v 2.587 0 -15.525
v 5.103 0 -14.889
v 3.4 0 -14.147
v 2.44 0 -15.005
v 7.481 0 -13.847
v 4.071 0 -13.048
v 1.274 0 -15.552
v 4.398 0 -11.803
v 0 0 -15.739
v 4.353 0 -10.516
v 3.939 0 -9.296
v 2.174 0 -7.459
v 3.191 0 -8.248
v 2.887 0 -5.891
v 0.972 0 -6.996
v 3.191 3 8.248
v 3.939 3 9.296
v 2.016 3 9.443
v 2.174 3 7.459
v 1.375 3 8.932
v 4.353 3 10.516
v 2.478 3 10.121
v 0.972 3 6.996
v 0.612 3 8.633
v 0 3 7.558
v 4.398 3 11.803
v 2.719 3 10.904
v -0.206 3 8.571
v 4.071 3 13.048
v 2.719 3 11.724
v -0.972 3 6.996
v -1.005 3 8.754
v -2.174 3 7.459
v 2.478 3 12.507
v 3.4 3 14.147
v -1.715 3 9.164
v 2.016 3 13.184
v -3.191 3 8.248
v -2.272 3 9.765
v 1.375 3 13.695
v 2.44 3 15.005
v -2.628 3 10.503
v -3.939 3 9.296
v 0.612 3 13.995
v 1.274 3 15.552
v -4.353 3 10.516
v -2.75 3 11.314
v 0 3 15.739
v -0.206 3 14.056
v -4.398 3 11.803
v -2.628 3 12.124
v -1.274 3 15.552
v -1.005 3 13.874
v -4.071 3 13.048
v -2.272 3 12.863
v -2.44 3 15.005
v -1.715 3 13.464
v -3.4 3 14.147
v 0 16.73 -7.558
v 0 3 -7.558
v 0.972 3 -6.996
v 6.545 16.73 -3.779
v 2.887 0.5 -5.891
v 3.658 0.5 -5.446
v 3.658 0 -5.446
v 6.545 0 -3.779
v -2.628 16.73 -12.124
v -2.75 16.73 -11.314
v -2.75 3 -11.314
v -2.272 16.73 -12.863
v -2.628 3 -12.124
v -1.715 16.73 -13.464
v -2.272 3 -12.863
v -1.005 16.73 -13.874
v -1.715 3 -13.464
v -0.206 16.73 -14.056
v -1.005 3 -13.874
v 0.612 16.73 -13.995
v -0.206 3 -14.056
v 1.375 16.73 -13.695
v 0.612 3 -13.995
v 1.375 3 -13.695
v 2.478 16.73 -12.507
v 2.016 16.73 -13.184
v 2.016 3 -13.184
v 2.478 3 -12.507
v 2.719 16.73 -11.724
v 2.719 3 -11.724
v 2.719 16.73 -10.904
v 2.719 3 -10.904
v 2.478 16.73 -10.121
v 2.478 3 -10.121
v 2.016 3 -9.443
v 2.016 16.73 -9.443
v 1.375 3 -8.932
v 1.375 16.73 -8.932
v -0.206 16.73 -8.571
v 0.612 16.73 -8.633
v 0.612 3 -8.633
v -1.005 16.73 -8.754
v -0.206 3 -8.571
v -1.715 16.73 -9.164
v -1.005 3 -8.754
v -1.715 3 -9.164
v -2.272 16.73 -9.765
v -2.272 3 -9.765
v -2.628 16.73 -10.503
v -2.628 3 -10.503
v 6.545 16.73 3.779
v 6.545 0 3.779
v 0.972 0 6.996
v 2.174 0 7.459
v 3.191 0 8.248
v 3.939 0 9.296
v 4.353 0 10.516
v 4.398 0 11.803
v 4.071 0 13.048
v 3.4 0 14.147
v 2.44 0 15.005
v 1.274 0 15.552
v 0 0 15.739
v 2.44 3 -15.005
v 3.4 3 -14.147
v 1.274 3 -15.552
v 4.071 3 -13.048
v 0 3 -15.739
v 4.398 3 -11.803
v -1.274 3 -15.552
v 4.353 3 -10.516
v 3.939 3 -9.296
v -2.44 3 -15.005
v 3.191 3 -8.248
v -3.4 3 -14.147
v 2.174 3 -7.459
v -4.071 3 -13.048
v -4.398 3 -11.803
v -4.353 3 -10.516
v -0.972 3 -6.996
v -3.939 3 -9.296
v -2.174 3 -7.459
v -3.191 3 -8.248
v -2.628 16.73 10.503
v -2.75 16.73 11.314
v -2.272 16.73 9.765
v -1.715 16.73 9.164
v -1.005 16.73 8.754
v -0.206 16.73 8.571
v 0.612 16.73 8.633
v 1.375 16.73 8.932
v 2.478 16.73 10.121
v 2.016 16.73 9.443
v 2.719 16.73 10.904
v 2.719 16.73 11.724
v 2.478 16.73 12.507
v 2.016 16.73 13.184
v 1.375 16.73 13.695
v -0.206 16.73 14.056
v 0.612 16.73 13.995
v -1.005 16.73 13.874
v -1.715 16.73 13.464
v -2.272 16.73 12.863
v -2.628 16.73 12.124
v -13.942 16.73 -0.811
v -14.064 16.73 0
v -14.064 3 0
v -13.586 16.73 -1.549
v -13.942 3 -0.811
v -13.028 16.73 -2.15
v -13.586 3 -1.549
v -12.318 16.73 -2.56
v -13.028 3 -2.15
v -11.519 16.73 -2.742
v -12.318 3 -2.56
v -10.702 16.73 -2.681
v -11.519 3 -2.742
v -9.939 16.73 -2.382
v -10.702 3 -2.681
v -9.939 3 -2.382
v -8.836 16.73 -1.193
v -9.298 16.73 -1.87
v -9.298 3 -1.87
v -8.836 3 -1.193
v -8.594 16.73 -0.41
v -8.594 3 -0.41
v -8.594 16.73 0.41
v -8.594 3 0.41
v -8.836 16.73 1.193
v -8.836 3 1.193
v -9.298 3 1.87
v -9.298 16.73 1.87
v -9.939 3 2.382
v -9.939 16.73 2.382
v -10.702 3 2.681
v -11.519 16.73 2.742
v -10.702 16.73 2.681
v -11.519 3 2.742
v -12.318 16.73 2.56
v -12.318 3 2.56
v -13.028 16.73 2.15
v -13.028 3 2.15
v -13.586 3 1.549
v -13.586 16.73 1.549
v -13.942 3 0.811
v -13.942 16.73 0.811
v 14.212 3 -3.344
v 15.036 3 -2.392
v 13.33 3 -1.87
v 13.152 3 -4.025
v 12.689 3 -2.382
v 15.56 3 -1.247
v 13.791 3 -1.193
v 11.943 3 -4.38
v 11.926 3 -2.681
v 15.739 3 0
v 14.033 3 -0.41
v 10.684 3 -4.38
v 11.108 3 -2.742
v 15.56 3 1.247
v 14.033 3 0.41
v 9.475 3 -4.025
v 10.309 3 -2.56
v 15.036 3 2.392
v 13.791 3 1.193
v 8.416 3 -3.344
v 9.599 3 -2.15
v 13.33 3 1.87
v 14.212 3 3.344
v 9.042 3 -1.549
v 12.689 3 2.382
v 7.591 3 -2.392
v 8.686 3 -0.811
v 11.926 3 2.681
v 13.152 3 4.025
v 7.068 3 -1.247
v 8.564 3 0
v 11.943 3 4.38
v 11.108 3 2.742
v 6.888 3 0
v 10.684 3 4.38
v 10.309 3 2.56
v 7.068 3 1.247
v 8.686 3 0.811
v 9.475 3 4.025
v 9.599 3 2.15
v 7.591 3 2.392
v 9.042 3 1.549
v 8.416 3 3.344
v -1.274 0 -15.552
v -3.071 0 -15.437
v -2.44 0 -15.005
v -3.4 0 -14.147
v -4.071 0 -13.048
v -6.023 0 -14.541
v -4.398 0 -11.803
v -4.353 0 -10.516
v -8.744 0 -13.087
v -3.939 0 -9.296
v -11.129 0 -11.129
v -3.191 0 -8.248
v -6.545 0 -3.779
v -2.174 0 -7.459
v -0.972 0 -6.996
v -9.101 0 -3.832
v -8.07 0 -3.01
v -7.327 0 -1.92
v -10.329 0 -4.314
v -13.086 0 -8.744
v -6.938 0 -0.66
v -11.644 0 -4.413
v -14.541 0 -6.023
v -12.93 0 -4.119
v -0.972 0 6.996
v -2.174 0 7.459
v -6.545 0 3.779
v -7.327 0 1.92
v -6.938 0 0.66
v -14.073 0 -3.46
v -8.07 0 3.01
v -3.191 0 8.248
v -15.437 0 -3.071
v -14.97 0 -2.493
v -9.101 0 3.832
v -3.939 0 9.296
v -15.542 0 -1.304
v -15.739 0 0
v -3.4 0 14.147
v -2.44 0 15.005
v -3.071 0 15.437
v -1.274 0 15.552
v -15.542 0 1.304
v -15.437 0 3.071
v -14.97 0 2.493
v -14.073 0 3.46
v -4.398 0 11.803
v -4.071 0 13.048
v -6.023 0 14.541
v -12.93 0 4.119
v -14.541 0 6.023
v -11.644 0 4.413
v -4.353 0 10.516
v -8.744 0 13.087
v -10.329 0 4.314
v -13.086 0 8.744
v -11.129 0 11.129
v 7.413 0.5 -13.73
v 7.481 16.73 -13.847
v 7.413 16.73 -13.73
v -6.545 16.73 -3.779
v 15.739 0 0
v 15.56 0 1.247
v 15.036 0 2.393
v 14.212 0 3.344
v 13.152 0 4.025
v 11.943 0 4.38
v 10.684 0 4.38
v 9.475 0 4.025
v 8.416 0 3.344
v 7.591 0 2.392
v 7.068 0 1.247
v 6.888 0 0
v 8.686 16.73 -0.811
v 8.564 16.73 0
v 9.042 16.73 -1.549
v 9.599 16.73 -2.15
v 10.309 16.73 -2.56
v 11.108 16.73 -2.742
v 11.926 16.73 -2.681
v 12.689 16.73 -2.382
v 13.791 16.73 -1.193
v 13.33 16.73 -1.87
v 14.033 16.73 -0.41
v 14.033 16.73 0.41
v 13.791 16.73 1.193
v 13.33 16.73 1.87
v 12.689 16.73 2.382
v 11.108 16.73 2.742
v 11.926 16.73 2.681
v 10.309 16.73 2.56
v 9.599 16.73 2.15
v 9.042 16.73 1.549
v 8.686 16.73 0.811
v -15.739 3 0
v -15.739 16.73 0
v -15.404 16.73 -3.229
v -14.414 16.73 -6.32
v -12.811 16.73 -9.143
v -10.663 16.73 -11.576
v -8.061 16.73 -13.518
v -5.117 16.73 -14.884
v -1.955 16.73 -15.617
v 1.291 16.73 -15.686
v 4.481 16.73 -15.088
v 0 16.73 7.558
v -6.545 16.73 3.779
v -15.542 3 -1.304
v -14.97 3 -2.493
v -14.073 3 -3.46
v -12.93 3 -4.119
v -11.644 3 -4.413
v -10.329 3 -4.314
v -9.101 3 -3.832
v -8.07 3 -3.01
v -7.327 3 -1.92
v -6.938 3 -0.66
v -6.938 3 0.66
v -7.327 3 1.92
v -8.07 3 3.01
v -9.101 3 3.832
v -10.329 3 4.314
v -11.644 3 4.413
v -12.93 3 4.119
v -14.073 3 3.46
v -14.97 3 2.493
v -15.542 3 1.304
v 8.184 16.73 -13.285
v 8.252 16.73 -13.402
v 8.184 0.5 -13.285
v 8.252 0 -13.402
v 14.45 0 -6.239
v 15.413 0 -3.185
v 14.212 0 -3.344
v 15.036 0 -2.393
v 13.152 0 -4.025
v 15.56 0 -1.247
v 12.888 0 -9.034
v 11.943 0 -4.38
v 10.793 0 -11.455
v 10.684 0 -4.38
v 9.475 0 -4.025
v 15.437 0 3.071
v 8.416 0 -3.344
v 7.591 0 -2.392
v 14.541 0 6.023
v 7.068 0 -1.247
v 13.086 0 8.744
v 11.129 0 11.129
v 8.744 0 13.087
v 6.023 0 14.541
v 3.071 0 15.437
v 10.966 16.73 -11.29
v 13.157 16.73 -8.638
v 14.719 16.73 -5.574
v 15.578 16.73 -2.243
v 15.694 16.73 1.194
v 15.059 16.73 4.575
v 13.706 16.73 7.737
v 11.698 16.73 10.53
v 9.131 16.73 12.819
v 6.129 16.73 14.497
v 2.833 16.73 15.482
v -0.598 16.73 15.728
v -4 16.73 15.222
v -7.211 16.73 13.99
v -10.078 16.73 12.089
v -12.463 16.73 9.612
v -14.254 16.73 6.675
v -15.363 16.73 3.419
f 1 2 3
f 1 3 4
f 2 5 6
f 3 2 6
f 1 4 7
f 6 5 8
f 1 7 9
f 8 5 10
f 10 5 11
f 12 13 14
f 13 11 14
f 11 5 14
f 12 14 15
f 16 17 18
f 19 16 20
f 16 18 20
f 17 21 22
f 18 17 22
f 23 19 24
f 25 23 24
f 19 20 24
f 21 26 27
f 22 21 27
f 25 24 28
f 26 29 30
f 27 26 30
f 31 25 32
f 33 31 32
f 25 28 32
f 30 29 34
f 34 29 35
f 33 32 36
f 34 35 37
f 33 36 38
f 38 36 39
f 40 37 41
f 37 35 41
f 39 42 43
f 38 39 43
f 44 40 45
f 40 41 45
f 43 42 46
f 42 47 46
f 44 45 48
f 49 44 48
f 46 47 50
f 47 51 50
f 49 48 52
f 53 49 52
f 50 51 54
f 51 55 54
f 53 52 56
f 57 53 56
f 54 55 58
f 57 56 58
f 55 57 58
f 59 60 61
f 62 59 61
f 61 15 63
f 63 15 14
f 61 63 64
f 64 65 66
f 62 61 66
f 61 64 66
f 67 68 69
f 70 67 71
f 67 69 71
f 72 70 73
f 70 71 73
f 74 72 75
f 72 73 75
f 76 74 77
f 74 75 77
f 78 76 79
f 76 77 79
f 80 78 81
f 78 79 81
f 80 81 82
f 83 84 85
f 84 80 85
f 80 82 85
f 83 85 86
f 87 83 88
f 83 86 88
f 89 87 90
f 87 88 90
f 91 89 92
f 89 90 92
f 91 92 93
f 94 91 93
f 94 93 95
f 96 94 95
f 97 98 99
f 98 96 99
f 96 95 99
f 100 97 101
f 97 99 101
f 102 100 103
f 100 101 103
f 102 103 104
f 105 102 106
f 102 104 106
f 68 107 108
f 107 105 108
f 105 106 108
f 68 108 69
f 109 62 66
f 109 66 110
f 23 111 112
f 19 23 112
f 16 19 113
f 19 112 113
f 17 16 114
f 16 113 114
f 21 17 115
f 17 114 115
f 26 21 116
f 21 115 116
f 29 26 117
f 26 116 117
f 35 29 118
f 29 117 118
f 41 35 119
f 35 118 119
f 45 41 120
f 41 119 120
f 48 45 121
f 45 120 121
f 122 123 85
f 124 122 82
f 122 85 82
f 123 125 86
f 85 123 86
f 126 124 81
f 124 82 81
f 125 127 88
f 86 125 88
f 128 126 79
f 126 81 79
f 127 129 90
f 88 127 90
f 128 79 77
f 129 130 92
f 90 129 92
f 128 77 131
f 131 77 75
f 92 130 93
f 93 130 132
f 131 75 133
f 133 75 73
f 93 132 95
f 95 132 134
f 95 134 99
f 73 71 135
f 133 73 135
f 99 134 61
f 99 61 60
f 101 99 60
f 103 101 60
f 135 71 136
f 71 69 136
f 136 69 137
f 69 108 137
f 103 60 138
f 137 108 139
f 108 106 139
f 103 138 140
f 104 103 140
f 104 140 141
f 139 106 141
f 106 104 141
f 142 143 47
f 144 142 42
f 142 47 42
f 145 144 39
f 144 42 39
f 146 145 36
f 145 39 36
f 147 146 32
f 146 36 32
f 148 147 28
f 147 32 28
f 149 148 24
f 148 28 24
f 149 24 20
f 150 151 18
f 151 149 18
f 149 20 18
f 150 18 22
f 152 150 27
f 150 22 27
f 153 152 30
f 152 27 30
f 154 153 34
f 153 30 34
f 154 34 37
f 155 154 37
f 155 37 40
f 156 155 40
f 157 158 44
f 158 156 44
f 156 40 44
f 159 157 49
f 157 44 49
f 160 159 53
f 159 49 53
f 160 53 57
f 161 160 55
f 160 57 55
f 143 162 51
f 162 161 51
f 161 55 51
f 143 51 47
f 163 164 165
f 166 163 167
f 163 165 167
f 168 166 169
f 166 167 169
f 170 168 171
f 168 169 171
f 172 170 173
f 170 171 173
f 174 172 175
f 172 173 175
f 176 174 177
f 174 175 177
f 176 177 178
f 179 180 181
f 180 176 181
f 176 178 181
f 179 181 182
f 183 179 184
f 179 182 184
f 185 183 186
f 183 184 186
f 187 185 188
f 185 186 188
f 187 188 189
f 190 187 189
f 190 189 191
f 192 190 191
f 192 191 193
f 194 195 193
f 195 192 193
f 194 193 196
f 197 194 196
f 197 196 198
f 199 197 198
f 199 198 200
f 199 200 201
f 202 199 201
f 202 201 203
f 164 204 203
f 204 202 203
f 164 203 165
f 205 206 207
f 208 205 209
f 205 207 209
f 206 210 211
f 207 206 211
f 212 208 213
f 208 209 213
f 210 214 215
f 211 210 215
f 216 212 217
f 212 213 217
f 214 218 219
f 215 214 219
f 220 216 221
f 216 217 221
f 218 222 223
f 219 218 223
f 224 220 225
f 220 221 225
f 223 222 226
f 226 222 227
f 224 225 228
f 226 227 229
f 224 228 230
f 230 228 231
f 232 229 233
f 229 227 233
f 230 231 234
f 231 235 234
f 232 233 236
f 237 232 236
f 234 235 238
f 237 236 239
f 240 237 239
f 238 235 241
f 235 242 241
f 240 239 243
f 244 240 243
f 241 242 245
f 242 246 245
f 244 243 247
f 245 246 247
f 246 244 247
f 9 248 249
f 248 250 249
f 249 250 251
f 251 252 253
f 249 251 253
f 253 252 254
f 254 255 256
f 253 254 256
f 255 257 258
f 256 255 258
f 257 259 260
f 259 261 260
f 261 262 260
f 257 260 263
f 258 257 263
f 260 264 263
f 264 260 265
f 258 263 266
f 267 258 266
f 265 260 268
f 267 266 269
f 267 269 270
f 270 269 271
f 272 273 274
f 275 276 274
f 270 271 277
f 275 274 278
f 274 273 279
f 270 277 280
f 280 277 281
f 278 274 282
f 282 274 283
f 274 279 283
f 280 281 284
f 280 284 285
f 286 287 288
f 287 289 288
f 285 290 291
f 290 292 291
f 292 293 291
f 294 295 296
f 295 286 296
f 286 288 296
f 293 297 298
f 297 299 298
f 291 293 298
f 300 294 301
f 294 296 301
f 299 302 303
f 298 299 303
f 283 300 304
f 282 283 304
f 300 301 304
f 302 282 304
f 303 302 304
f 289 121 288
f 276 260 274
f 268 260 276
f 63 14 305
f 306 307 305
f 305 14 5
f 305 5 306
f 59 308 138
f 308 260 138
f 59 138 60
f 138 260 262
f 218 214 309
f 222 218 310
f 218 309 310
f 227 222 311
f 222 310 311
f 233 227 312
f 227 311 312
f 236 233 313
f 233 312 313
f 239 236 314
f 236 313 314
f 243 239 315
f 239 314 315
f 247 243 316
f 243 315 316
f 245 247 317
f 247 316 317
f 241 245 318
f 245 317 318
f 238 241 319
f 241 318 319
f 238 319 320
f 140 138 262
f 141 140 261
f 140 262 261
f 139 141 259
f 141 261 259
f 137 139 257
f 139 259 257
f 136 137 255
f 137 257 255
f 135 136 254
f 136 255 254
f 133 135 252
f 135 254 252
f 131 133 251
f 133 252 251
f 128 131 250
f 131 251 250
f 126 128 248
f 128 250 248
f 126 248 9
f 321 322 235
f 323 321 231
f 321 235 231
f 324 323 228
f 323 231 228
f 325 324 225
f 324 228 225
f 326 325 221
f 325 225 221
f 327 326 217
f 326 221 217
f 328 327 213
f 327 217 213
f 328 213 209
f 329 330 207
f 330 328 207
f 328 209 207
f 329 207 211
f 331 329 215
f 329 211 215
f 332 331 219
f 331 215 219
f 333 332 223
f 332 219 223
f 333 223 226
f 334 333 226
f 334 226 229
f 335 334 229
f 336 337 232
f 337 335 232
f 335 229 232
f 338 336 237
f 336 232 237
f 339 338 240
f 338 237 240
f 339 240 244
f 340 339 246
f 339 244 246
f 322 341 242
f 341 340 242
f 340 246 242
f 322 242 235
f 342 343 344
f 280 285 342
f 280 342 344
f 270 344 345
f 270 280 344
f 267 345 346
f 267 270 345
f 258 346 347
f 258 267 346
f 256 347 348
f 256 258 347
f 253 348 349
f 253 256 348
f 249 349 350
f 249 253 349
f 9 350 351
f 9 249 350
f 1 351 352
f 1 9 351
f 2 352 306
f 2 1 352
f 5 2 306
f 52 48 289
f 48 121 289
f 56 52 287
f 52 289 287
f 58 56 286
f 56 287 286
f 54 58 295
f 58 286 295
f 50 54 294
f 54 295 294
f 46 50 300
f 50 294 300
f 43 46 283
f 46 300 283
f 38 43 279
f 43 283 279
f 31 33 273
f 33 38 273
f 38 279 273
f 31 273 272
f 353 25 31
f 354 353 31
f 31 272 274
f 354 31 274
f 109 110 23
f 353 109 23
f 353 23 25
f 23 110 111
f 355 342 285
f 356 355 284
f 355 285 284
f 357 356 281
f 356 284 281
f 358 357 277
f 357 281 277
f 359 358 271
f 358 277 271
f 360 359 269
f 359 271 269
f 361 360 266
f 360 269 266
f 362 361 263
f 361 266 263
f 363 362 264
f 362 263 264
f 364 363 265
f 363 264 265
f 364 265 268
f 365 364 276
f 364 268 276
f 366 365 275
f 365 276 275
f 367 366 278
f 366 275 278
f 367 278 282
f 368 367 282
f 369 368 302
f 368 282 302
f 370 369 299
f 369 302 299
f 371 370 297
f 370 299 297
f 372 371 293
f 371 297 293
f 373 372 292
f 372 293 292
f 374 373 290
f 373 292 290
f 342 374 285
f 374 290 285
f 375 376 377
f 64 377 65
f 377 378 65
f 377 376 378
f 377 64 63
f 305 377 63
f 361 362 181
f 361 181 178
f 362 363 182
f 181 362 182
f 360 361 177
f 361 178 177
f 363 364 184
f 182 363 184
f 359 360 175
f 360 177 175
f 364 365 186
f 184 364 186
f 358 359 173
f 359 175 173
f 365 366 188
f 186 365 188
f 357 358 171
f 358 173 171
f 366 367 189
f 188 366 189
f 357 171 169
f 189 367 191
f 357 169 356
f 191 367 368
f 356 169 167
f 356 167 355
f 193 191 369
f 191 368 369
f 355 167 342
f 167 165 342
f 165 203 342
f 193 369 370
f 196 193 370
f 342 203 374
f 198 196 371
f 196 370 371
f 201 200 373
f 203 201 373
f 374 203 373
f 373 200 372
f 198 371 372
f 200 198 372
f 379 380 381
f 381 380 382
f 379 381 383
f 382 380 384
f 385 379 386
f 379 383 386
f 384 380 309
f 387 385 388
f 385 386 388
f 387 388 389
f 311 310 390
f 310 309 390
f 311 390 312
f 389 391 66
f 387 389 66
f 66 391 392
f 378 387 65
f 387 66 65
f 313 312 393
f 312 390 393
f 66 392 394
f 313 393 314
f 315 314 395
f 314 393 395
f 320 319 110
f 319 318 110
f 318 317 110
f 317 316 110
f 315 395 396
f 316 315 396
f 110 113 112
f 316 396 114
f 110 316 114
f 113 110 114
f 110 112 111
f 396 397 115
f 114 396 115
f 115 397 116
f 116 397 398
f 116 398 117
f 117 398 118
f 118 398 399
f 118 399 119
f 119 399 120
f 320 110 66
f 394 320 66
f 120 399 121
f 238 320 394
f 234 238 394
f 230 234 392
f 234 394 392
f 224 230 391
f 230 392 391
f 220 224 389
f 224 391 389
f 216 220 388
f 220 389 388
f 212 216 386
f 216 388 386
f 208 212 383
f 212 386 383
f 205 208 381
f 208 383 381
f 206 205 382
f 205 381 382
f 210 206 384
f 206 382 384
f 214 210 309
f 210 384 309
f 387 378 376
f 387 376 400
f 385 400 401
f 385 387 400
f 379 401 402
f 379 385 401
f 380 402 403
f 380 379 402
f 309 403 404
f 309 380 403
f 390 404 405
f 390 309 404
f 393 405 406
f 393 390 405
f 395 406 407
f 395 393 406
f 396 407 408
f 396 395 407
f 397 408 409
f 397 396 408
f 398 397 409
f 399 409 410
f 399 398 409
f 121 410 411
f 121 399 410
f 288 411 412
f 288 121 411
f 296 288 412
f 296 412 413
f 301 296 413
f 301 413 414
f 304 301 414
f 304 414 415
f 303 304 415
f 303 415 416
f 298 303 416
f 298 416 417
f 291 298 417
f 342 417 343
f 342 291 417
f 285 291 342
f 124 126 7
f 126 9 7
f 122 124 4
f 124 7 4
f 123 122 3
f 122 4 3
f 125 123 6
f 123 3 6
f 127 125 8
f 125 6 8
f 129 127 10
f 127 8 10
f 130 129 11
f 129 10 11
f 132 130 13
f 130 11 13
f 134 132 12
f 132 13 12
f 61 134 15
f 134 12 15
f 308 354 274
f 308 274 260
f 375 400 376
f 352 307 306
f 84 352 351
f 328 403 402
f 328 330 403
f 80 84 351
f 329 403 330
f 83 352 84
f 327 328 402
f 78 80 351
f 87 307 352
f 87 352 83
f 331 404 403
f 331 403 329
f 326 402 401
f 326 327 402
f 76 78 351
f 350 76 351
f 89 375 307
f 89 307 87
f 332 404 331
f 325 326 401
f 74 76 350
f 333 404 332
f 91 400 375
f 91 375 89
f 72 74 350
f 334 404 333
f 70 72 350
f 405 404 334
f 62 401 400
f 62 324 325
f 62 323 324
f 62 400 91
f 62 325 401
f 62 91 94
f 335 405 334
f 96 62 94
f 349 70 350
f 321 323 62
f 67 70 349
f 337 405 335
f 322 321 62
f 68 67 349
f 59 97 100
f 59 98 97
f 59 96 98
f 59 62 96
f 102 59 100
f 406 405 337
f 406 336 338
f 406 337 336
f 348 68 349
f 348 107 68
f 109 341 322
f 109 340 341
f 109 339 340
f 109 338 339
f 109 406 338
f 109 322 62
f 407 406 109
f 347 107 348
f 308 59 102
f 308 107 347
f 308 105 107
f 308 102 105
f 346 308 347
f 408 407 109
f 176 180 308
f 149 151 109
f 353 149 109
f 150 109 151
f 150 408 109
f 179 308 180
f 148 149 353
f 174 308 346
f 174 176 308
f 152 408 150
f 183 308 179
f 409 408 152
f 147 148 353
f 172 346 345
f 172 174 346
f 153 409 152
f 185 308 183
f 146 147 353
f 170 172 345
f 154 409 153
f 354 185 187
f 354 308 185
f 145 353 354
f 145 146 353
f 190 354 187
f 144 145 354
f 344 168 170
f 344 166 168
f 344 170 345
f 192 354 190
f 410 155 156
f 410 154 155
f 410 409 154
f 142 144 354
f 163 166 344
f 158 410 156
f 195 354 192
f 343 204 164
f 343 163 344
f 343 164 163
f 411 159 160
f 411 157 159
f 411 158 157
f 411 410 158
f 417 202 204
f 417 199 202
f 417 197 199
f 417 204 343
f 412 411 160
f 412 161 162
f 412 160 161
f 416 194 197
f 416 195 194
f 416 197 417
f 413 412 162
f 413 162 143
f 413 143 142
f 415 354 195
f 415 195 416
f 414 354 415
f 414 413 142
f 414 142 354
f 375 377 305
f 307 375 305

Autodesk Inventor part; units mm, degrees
ref_plane "YZ Plane" through (0, 0, 0) normal (1, 0, 0) x (0, 1, 0)
ref_plane "XZ Plane" through (0, 0, 0) normal (0, 1, 0) x (-1, 0, 0)
ref_plane "XY Plane" through (0, 0, 0) normal (0, 0, 1) x (1, 0, 0)
sketch "Sketch1" plane through (0, 0, 0) normal (0, 1, 0) x (-1, 0, 0)
  circle A0 centre (11.3137, 0) radius 2.75
  circle A1 centre (0, 0) radius 15.739
  line L0 (0, -7.5575) -> (-6.545, -3.7788)
  line L1 (-6.545, -3.7788) -> (-6.545, 3.7788)
  line L2 (-6.545, 3.7788) -> (0, 7.5575)
  line L3 (0, 7.5575) -> (6.545, 3.7788)
  line L4 (6.545, 3.7788) -> (6.545, -3.7788)
  line L5 (6.545, -3.7788) -> (0, -7.5575)
  circle A2 centre (0, 11.3137) radius 2.75
  circle A3 centre (-11.3137, 0) radius 2.75
  circle A4 centre (0, -11.3137) radius 2.75
  circle A5 centre (0, 0) radius 3.4
  circle A6 centre (0, -11.3137) radius 4.4253
  circle A7 centre (11.3137, 0) radius 4.4253
  circle A8 centre (0, 11.3137) radius 4.4253
  circle A9 centre (-11.3137, 0) radius 4.4253
  line L6 (-2.8871, -5.8906) -> (-7.481, -13.8474)
  line L7 (-8.2517, -13.4024) -> (-3.6579, -5.4456)
  line L8 (-8.1837, -13.2847) -> (-7.413, -13.7297)
  point P0 (0, 0)
  dimension "d0" = 31.478
  dimension "d3" = 13.09
  dimension "d4" = 5.5
  dimension "d7" = 360
  dimension "d11" = 6.8
  dimension "d14" = 360
extrude "Extrusion1" add sketch "Sketch1" along normal blind 16.73 contours L7 L8 L6 A1 | A9 | A1 A8 L2 L1 L0 L7 | L6 L0 A6 A1 | L7 L0 L6 L8 | A7 | A6 L5 L4 L3 A8 A1 | A6 L0 L5 | A8 L3 L2 picked at (-1.3101, -7.6989) picked at (-1.3101, 7.6989)
extrude "Extrusion3" cut sketch "Sketch1" along normal blind 3 contours A0 | A9 | A7 | A6 L0 L5 | A8 L3 L2 | A6 L5 L0 | L2 L3 A8 | A2 | A3 | A4
extrude "Extrusion4" cut sketch "Sketch1" along normal blind 0.5 contours L7 L0 L6 L8
extrude "Extrusion5" cut sketch "Sketch1" along normal through all contours L7 L8 L6 A1
properties part number "GoBilda Mech Hub 0500 HexV2"
